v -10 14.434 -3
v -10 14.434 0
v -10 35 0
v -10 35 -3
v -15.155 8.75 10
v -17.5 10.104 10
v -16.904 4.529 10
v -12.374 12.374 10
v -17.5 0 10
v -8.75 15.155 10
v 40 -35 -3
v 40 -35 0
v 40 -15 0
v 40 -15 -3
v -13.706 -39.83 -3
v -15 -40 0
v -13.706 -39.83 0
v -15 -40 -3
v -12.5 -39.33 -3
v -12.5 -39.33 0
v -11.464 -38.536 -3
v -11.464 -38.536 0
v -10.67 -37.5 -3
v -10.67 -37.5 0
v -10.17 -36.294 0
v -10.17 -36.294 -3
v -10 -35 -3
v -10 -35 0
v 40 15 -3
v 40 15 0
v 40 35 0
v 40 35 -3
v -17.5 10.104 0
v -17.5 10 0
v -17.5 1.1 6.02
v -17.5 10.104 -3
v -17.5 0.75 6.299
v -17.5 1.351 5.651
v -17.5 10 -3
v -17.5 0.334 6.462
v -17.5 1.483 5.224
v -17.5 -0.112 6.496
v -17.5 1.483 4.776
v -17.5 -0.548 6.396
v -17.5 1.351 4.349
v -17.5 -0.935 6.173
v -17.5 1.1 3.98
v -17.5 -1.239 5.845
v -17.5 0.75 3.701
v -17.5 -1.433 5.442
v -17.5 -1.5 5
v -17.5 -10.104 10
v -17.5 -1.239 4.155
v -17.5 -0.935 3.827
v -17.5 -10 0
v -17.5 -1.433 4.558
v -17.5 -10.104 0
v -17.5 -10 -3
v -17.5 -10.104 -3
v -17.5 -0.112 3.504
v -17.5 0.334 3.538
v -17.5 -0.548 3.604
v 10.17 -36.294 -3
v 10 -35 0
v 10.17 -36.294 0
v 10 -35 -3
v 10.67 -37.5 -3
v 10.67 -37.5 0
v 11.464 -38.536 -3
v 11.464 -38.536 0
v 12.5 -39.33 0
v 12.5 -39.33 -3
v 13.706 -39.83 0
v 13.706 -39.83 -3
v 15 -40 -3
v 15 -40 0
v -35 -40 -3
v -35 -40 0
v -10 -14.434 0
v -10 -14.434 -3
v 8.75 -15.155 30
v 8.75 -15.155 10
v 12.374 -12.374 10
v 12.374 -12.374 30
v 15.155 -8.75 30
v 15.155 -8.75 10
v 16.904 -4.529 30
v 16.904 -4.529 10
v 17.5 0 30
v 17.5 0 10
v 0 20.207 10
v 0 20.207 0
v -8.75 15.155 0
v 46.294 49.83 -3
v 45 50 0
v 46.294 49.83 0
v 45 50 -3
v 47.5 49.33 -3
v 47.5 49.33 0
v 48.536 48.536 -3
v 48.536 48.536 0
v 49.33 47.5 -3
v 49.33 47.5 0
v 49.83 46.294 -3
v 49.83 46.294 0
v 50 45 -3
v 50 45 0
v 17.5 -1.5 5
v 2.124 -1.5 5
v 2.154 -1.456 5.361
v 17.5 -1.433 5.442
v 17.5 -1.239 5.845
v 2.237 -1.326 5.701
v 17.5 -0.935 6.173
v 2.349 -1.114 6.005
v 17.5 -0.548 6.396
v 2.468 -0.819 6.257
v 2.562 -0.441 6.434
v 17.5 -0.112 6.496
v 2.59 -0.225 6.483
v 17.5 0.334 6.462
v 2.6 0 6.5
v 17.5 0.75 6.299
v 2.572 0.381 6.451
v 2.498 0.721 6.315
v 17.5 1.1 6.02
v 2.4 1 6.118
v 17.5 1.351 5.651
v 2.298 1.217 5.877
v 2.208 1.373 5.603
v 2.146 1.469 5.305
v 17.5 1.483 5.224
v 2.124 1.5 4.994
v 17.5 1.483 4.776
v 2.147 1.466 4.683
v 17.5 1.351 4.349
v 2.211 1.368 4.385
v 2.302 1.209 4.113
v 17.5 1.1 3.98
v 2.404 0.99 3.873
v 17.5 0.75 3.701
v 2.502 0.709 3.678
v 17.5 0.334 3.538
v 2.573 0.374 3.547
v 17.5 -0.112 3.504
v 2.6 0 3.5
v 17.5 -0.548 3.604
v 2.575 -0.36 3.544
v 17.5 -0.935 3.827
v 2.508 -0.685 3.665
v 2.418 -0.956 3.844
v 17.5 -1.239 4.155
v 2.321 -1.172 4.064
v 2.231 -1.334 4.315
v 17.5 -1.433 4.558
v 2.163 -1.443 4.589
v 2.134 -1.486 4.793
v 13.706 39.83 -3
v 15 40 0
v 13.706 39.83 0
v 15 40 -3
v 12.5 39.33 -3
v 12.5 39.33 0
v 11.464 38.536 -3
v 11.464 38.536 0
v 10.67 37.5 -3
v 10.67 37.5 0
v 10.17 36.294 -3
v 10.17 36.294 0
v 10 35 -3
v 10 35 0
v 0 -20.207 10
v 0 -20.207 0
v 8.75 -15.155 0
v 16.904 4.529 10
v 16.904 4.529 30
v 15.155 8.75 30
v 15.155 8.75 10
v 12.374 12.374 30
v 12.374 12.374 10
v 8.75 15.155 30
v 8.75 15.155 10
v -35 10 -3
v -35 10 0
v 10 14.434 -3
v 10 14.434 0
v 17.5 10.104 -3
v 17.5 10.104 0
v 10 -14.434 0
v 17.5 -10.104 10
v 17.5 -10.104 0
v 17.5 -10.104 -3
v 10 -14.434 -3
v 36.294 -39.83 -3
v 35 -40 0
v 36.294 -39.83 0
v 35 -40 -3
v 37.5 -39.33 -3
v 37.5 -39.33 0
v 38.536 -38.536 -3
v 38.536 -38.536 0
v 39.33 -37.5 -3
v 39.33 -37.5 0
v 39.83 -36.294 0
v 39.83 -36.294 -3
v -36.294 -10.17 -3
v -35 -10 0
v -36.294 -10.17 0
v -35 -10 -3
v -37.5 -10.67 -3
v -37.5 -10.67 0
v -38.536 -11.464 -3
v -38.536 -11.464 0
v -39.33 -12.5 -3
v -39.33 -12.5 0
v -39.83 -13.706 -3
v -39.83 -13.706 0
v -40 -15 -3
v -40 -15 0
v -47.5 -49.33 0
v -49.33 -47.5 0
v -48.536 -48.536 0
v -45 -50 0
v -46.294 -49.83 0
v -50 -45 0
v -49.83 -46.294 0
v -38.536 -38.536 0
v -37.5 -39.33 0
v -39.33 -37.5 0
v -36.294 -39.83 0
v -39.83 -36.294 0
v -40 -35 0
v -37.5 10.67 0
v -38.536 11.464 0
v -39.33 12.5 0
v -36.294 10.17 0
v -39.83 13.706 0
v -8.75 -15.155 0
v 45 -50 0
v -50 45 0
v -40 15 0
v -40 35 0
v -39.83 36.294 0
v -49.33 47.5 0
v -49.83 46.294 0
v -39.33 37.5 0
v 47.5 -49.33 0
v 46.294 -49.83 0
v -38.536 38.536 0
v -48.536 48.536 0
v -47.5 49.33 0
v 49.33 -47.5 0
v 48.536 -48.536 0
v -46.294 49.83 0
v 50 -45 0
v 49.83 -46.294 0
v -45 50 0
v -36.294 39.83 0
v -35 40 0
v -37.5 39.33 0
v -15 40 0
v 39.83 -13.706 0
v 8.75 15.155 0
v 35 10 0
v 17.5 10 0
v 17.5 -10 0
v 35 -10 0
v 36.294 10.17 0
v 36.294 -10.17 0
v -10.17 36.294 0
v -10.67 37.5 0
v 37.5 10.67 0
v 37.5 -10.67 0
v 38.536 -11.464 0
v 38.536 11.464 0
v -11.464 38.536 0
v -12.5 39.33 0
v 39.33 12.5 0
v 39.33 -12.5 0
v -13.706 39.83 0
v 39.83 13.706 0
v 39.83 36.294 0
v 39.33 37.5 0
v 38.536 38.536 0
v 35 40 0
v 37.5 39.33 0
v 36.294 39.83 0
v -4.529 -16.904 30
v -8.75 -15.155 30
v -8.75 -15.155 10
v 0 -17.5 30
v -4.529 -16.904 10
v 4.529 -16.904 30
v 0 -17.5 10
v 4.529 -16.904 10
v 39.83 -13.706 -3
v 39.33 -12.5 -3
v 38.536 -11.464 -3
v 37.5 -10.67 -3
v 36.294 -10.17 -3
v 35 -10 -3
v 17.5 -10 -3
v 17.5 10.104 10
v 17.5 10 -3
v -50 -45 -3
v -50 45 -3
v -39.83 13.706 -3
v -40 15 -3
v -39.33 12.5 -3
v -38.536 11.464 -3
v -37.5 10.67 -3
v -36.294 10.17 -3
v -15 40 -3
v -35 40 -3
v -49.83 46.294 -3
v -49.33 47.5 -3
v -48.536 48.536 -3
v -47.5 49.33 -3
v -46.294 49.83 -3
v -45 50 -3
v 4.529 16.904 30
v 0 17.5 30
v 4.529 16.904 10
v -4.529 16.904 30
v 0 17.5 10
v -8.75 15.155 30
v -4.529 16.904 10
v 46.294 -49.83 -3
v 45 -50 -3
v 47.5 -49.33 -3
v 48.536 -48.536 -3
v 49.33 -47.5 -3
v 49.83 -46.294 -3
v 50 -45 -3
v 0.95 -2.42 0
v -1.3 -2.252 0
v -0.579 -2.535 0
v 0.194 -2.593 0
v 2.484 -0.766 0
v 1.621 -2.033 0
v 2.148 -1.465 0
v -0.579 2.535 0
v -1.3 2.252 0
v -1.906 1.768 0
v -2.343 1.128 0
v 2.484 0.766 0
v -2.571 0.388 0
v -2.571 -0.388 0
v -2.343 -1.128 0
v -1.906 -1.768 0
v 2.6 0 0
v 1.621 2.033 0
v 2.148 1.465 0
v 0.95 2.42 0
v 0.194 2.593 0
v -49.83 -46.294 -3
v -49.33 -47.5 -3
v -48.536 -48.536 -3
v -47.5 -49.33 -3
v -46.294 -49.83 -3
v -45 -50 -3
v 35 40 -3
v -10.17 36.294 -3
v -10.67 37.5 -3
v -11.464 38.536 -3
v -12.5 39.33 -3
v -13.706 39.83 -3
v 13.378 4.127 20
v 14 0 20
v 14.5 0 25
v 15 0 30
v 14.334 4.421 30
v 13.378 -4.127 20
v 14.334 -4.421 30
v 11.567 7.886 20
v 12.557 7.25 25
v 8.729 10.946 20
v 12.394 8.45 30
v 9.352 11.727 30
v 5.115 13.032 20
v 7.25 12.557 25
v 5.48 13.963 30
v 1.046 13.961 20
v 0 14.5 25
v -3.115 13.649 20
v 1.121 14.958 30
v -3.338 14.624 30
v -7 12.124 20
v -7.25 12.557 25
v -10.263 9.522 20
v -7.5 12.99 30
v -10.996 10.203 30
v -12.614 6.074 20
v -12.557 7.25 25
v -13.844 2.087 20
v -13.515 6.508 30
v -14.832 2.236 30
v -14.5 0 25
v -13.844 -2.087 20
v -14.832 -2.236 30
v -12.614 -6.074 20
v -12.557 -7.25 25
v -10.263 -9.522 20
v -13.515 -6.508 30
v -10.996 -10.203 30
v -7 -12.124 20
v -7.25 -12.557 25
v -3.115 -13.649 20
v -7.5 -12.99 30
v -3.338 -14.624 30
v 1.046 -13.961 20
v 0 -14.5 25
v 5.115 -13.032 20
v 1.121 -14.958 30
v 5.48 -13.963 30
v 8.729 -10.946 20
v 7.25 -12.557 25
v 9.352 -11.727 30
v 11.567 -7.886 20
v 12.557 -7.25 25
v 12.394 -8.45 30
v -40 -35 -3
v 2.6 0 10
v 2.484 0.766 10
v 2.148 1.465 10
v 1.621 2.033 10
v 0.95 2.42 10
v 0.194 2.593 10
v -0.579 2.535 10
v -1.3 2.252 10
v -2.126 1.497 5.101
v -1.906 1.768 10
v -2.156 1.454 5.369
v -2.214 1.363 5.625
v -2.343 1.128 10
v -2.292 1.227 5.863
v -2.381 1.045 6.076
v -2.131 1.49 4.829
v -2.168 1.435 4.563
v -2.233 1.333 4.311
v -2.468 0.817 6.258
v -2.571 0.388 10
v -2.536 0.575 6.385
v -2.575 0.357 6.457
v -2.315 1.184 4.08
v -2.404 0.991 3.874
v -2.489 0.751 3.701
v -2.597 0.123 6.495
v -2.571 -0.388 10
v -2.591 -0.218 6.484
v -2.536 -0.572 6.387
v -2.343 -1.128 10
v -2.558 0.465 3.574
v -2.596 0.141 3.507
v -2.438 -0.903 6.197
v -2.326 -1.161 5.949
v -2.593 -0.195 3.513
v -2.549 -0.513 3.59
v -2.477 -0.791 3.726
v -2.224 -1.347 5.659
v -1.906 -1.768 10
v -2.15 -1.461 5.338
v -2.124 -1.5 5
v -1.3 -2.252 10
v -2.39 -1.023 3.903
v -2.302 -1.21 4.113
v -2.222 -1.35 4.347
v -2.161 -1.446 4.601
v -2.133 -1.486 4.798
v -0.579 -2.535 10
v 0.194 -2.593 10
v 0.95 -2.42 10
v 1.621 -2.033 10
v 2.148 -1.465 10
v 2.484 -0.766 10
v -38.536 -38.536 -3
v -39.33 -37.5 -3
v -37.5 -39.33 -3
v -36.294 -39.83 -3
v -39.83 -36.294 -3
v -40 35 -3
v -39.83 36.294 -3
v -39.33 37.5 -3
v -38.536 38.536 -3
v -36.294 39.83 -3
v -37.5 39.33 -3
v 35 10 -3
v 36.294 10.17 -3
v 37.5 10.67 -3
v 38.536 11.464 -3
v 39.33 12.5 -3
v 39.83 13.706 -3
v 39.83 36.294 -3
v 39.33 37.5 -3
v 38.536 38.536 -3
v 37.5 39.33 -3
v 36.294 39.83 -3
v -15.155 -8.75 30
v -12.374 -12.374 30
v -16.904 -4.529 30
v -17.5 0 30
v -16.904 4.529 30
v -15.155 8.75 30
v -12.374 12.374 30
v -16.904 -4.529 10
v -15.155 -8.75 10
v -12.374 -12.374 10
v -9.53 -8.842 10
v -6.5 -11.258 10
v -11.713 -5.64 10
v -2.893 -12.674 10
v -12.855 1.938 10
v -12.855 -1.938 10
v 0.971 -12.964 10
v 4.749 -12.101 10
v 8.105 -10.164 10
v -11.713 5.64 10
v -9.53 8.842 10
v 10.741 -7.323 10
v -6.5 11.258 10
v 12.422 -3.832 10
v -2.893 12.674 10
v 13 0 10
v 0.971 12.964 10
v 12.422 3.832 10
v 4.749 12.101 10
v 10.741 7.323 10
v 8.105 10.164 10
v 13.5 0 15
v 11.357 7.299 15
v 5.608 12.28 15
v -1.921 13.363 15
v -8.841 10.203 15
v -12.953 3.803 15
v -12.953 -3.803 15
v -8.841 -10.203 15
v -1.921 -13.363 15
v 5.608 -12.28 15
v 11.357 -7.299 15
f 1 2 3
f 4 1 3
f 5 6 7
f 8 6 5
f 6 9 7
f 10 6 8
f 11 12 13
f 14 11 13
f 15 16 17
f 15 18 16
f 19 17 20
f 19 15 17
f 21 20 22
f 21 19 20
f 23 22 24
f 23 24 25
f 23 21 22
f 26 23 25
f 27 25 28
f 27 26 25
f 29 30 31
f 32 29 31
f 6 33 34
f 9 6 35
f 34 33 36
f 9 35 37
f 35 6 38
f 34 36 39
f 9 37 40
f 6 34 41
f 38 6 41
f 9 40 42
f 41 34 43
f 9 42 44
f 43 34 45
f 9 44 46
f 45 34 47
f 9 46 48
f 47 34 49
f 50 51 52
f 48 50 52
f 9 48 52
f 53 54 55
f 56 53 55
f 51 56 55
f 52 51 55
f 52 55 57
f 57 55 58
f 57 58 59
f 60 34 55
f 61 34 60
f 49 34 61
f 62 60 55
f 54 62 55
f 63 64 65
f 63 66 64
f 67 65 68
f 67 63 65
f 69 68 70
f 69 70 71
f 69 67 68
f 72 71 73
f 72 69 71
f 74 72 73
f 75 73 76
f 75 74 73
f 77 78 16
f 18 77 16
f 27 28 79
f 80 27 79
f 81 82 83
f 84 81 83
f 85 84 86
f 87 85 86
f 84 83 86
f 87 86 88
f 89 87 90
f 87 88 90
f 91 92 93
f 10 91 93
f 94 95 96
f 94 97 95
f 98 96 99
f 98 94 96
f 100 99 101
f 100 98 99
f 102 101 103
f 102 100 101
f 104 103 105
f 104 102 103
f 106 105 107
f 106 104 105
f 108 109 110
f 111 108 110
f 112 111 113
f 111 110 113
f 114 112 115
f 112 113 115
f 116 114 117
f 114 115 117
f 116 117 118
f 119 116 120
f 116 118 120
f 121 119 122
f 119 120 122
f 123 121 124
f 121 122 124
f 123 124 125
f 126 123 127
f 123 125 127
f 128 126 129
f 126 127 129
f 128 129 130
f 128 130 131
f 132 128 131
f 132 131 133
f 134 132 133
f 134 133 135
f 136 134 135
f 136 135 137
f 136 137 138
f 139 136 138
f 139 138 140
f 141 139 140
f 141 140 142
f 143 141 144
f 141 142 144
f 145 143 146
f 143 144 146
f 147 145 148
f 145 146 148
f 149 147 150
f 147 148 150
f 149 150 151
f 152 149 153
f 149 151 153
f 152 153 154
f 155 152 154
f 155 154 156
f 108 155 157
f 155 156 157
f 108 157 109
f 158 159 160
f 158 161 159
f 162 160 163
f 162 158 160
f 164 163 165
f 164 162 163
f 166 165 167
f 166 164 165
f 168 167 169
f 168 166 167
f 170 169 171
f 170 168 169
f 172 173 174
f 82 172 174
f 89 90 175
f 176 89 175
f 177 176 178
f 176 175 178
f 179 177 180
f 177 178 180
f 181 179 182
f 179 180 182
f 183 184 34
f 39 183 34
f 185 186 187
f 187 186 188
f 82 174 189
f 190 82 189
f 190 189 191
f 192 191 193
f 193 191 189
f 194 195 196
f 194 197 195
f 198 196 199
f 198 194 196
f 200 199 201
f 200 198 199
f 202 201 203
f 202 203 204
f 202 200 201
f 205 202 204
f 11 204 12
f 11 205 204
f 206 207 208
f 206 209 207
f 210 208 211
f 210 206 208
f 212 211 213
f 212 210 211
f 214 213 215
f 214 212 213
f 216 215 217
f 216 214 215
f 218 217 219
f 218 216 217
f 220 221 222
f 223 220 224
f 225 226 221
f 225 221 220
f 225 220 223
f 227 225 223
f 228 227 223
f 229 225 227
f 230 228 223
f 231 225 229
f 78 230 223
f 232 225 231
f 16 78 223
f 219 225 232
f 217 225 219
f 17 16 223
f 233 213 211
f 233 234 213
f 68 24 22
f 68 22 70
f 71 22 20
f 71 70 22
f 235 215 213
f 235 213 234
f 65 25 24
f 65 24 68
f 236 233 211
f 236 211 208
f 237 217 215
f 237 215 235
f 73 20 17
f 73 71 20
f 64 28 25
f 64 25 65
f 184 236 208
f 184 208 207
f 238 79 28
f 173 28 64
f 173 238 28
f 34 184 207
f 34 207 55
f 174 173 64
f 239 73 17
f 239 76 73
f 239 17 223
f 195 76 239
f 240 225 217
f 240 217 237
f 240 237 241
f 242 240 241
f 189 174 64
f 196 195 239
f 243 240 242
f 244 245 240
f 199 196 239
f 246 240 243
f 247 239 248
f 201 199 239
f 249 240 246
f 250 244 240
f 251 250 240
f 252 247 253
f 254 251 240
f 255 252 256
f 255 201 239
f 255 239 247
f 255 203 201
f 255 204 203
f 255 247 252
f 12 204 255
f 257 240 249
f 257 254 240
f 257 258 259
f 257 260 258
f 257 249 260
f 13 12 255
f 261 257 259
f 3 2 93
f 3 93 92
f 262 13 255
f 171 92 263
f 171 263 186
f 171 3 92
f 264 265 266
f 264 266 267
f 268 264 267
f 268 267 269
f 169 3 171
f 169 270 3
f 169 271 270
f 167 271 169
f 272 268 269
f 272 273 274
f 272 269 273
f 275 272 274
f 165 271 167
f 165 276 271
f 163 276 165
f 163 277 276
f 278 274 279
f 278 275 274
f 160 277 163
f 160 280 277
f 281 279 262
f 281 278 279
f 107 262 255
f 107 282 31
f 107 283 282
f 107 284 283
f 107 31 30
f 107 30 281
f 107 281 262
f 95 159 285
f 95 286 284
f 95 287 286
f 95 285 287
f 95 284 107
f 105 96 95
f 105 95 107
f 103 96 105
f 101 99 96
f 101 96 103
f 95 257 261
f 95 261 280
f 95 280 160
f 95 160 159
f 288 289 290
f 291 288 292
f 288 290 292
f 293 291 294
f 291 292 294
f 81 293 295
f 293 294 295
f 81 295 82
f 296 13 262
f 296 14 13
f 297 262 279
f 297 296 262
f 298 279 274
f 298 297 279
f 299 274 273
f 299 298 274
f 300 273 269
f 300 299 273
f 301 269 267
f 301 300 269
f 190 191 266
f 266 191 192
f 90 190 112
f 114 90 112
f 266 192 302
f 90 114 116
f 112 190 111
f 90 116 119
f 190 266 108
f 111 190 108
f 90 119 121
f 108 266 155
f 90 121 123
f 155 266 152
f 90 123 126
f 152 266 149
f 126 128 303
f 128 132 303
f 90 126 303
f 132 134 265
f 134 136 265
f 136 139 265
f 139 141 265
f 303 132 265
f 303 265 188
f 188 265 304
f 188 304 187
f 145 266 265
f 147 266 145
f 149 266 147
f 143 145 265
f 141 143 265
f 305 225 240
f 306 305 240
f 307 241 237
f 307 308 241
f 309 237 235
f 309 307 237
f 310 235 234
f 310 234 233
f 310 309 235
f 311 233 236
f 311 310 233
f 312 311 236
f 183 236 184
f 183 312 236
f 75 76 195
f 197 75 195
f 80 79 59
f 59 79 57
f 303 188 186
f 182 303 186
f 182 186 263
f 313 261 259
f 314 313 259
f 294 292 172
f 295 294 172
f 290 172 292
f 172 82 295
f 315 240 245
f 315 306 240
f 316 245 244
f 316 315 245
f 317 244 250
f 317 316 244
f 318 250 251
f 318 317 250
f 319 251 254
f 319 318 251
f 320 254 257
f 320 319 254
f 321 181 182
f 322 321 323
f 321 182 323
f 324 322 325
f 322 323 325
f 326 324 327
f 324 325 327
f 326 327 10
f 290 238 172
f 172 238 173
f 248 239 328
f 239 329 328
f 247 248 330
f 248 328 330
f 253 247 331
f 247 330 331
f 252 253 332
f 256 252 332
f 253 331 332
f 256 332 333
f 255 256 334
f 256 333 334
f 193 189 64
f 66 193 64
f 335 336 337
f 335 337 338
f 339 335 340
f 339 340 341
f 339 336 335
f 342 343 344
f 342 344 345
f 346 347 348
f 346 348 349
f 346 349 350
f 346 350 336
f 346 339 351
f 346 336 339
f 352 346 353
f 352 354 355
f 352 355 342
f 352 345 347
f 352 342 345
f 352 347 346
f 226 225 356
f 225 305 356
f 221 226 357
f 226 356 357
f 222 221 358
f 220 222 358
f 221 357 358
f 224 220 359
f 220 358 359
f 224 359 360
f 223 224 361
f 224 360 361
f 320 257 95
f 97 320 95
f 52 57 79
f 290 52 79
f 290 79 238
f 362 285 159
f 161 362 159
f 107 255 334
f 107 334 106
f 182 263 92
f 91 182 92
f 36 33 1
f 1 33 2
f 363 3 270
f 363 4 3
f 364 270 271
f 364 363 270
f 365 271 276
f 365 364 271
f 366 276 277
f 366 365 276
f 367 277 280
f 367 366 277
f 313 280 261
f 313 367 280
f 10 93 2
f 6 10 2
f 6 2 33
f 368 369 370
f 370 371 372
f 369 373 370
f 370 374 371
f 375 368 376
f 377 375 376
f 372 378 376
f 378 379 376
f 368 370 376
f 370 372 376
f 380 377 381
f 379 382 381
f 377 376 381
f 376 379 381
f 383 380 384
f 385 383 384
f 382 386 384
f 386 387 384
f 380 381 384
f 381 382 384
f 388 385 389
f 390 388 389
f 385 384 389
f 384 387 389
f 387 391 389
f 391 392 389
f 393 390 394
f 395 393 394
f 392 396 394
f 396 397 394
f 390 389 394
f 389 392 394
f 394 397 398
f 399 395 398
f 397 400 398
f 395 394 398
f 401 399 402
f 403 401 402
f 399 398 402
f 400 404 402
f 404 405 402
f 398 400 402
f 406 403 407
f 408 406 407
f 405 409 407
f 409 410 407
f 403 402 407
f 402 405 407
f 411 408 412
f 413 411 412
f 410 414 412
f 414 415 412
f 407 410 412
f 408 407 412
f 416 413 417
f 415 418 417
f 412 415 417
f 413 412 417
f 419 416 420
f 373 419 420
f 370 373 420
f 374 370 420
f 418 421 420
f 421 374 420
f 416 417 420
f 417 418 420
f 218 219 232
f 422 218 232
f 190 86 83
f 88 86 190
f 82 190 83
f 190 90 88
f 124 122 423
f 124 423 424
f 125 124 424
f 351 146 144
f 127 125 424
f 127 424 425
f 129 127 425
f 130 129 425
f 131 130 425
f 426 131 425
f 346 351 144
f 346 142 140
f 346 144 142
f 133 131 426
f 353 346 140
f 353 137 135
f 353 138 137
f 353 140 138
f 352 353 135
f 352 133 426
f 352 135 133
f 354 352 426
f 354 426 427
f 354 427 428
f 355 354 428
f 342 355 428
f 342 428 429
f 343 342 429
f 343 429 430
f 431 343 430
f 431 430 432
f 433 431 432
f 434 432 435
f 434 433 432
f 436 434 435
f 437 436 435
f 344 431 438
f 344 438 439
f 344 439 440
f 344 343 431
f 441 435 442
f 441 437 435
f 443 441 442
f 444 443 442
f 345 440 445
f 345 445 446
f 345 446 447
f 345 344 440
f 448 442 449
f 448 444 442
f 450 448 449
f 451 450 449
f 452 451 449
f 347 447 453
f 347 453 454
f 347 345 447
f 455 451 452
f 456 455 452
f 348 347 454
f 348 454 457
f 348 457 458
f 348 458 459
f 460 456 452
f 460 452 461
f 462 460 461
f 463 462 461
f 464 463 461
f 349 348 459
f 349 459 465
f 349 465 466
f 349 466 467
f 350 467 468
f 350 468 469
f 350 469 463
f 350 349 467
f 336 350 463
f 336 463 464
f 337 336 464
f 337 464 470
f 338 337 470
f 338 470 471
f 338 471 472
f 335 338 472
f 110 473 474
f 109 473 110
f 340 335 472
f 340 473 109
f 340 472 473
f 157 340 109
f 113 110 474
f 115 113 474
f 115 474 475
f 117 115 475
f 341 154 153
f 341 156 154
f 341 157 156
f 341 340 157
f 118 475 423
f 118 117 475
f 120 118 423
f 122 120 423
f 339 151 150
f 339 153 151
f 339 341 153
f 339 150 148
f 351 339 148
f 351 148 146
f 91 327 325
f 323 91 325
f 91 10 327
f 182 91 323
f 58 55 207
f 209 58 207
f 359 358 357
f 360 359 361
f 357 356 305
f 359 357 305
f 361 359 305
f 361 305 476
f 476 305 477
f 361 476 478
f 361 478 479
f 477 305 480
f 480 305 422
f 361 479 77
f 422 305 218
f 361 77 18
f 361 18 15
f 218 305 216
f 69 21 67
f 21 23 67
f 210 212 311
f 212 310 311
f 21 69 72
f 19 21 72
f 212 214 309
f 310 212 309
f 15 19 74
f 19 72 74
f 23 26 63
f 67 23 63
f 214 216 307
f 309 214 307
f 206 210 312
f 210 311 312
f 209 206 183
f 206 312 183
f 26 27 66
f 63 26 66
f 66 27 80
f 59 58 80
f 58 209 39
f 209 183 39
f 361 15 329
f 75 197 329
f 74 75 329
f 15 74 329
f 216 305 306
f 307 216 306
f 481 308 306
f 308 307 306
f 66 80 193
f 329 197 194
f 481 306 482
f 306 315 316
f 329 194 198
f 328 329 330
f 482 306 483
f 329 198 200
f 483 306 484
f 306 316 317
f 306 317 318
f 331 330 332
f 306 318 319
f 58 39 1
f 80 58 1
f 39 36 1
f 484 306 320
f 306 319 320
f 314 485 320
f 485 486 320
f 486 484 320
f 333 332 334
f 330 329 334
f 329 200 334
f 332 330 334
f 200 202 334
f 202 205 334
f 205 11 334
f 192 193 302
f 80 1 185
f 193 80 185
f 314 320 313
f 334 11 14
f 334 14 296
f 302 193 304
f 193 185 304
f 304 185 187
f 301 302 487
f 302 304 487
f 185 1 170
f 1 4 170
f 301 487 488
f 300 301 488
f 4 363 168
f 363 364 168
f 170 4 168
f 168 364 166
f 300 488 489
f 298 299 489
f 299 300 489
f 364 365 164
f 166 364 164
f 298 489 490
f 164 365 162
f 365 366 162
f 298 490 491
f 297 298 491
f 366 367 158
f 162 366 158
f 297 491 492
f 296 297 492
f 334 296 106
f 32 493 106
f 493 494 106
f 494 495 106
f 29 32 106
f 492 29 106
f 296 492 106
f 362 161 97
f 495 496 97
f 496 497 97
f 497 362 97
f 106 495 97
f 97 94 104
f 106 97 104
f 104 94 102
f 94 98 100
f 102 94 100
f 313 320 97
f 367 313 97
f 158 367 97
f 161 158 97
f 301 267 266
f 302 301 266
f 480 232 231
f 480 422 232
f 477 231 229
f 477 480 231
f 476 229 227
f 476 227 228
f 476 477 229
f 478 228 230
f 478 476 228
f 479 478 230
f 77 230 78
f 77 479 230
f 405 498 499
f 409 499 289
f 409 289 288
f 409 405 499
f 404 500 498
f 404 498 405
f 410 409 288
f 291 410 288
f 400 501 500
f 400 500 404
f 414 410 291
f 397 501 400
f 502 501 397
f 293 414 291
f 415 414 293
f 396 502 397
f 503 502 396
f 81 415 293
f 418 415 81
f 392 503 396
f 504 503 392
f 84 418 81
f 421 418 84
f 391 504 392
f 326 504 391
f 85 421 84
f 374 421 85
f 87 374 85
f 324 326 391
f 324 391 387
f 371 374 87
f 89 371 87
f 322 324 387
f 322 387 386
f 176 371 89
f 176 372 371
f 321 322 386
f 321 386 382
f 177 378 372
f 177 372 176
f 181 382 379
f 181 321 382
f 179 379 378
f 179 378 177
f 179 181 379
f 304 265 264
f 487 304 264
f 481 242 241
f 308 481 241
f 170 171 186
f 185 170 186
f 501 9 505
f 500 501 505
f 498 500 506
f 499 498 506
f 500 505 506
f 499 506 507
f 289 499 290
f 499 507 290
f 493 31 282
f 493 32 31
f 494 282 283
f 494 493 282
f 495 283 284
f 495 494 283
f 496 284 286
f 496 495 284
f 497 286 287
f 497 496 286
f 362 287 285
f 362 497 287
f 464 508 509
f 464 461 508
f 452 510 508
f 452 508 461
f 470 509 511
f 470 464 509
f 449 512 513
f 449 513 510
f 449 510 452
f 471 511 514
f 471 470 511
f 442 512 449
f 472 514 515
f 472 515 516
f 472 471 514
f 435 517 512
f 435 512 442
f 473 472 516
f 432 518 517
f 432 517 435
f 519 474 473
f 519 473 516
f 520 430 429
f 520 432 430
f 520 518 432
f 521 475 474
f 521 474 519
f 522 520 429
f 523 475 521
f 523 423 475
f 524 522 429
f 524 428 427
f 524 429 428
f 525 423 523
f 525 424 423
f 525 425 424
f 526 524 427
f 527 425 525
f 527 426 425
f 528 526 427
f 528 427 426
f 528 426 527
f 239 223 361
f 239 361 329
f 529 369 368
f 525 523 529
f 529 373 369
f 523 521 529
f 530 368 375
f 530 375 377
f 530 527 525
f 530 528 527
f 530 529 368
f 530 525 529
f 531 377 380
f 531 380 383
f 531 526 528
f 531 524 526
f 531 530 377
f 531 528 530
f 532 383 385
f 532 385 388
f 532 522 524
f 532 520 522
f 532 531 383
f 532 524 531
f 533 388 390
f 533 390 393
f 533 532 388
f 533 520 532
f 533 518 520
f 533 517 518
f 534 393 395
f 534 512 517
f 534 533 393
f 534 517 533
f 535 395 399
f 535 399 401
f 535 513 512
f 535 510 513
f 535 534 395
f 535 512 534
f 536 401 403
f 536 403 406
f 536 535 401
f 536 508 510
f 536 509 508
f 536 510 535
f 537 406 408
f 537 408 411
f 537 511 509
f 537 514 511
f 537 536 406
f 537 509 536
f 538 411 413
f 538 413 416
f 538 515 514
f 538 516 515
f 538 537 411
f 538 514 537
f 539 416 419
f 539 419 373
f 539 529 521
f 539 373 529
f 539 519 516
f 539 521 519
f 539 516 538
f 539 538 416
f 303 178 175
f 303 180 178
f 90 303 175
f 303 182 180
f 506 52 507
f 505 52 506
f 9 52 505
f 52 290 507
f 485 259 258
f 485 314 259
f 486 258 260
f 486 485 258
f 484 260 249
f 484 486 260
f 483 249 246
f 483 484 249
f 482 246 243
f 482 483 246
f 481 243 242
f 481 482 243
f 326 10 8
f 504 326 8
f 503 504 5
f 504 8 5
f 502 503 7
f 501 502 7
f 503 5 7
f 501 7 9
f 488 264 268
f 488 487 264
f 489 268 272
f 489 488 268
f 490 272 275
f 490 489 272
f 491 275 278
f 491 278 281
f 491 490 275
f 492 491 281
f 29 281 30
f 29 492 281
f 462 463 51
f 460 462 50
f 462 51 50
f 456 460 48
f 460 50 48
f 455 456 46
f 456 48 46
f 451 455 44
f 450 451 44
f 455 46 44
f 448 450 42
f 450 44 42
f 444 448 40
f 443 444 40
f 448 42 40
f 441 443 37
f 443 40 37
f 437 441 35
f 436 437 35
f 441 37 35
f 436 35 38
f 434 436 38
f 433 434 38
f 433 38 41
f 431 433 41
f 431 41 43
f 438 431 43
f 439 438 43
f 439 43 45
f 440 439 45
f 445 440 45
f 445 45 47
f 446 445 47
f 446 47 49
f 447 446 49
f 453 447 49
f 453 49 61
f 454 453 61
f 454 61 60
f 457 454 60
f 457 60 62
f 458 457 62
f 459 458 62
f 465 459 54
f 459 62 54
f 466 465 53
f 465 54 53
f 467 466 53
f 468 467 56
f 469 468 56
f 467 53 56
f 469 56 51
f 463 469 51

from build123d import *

# Parameters (mm, degrees)
F0_R      = 2.6
F1_DEPTH  = 10
F2_R      = 14
F3_DEPTH  = 20
F4_R      = 1.5
F5_DEPTH  = 35.001
F6_SIZE2  = 0.99999
F6_SIZE   = 9.99999
F7_W      = 100
F7_H      = 100
F8_DEPTH  = 3
F10_DEPTH = 25
F11_R     = 5


# Not quite as in the source:
# - a fillet or chamfer is up to 0.001 mm smaller than in the source, because OpenCascade refuses the exact size


with BuildPart() as f1:
    # F0 (on Top) → F1 (new body)
    with BuildSketch(Plane.XY):
        with BuildLine():
            ThreePointArc((8.7499999554, -15.155444592), (15.1554445533, -8.7500000223), (17.5, 0))
            ThreePointArc((17.5, 0), (15.15544445, 8.7500002013), (8.7499995974, 15.1554447987))
            ThreePointArc((8.7499995974, 15.1554447987), (-2.067e-07, 17.5), (-8.7499999554, 15.155444592))
            ThreePointArc((-8.7499999554, 15.155444592), (-15.155444558, 8.7500000142), (-17.5, -1.86e-08))
            ThreePointArc((-17.5, -1.86e-08), (-15.1554444739, -8.7500001599), (-8.7499996963, -15.1554447416))
            ThreePointArc((-8.7499996963, -15.1554447416), (1.496e-07, -17.5), (8.7499999554, -15.155444592))
        make_face()
        Circle(F0_R, mode=Mode.SUBTRACT)
        with BuildLine():
            Line((-17.5, -10.1036297108), (-8.7499996963, -15.1554447416))
            ThreePointArc((-8.7499996963, -15.1554447416), (-15.1554444739, -8.7500001599), (-17.5, -1.86e-08))
            Line((-17.5, -1.86e-08), (-17.5, -10.1036297108))
        make_face()
        with BuildLine():
            Line((0, -20.2072594216), (8.7499999554, -15.155444592))
            ThreePointArc((8.7499999554, -15.155444592), (1.496e-07, -17.5), (-8.7499996963, -15.1554447416))
            Line((-8.7499996963, -15.1554447416), (0, -20.2072594216))
        make_face()
        with BuildLine():
            Line((17.5, -10.1036297108), (17.5, 0))
            ThreePointArc((17.5, 0), (15.1554445533, -8.7500000223), (8.7499999554, -15.155444592))
            Line((8.7499999554, -15.155444592), (17.5, -10.1036297108))
        make_face()
        with BuildLine():
            ThreePointArc((8.7499995974, 15.1554447987), (15.15544445, 8.7500002013), (17.5, 0))
            Line((17.5, 0), (17.5, 10.1036297108))
            Line((17.5, 10.1036297108), (8.7499995974, 15.1554447987))
        make_face()
        with BuildLine():
            ThreePointArc((-8.7499999554, 15.155444592), (-2.067e-07, 17.5), (8.7499995974, 15.1554447987))
            Line((8.7499995974, 15.1554447987), (0, 20.2072594216))
            Line((0, 20.2072594216), (-8.7499999554, 15.155444592))
        make_face()
        with BuildLine():
            ThreePointArc((-17.5, -1.86e-08), (-15.155444558, 8.7500000142), (-8.7499999554, 15.155444592))
            Line((-8.7499999554, 15.155444592), (-17.5, 10.1036297108))
            Line((-17.5, 10.1036297108), (-17.5, -1.86e-08))
        make_face()
    extrude(amount=F1_DEPTH)

    # F2 (on face) → F3 (join)
    with BuildSketch(Plane.XY.offset(10)):
        with BuildLine():
            ThreePointArc((8.7500002145, -15.1554444424), (15.1554446281, -8.7499998928), (17.5, 0))
            ThreePointArc((17.5, 0), (15.1554446281, 8.7499998928), (8.7500002145, 15.1554444424))
            ThreePointArc((8.7500002145, 15.1554444424), (1.496e-07, 17.5), (-8.7499999554, 15.155444592))
            ThreePointArc((-8.7499999554, 15.155444592), (-15.155444558, 8.7500000142), (-17.5, -1.86e-08))
            ThreePointArc((-17.5, -1.86e-08), (-15.1554446126, -8.7499999197), (-8.7500001767, -15.1554444642))
            ThreePointArc((-8.7500001767, -15.1554444642), (2.18e-08, -17.5), (8.7500002145, -15.1554444424))
        make_face()
        Circle(F2_R, mode=Mode.SUBTRACT)
    extrude(amount=F3_DEPTH)

    # F4 (on face) → F5 (cut, through all)
    with BuildSketch(Plane(origin=(-17.5, 0, 0), x_dir=(0, -1, 0), z_dir=(-1, 0, 0))):
        with Locations((0, 5)):
            Circle(F4_R)
    extrude(amount=-F5_DEPTH, mode=Mode.SUBTRACT)

    # F6 (size 10 and 1 in the source; OpenCascade refuses exactly that, so slightly less here)
    f6_edges = [f1.edges().sort_by_distance(p)[0] for p in [
        (14, 0, 20),
        (-14, 0, 10),
        (-14, 0, 30),
    ]]
    f6_side = f1.faces().sort_by_distance((-14, 0, 20))[0]
    chamfer(f6_edges, length=F6_SIZE, length2=F6_SIZE2, reference=f6_side)

    # F7 (on Top) → F8 (join)
    with BuildSketch(Plane.XY):
        Rectangle(F7_W, F7_H)
    extrude(amount=-F8_DEPTH)

    # F9 (on face) → F10 (cut)
    with BuildSketch(Plane.XY):
        Polygon((-40, 40), (-40, 10), (-17.5, 10), (-17.5, 10.1036297108), (-10, 14.4337567297), (-10, 40), align=None)
        Polygon((17.5, 10), (40, 10), (40, 40), (10, 40), (10, 14.4337567297), (17.5, 10.1036297108), align=None)
        Polygon((10, -14.4337567297), (10, -40), (40, -40), (40, -10), (17.5, -10), (17.5, -10.1036297108), align=None)
        Polygon((-40, -10), (-40, -40), (-10, -40), (-10, -14.4337567297), (-17.5, -10.1036297108), (-17.5, -10), align=None)
    extrude(amount=-F10_DEPTH, mode=Mode.SUBTRACT)

    # F11
    f11_edges = [f1.edges().sort_by_distance(p)[0] for p in [
        (-40, 40, -1.5),
        (-10, 40, -1.5),
        (-40, 10, -1.5),
        (10, 40, -1.5),
        (40, 40, -1.5),
        (40, 10, -1.5),
        (40, -10, -1.5),
        (10, -40, -1.5),
        (40, -40, -1.5),
        (-10, -40, -1.5),
        (-40, -40, -1.5),
        (-40, -10, -1.5),
        (50, -50, -1.5),
        (-50, -50, -1.5),
        (-50, 50, -1.5),
        (50, 50, -1.5),
    ]]
    fillet(f11_edges, radius=F11_R)


solid = f1.part
